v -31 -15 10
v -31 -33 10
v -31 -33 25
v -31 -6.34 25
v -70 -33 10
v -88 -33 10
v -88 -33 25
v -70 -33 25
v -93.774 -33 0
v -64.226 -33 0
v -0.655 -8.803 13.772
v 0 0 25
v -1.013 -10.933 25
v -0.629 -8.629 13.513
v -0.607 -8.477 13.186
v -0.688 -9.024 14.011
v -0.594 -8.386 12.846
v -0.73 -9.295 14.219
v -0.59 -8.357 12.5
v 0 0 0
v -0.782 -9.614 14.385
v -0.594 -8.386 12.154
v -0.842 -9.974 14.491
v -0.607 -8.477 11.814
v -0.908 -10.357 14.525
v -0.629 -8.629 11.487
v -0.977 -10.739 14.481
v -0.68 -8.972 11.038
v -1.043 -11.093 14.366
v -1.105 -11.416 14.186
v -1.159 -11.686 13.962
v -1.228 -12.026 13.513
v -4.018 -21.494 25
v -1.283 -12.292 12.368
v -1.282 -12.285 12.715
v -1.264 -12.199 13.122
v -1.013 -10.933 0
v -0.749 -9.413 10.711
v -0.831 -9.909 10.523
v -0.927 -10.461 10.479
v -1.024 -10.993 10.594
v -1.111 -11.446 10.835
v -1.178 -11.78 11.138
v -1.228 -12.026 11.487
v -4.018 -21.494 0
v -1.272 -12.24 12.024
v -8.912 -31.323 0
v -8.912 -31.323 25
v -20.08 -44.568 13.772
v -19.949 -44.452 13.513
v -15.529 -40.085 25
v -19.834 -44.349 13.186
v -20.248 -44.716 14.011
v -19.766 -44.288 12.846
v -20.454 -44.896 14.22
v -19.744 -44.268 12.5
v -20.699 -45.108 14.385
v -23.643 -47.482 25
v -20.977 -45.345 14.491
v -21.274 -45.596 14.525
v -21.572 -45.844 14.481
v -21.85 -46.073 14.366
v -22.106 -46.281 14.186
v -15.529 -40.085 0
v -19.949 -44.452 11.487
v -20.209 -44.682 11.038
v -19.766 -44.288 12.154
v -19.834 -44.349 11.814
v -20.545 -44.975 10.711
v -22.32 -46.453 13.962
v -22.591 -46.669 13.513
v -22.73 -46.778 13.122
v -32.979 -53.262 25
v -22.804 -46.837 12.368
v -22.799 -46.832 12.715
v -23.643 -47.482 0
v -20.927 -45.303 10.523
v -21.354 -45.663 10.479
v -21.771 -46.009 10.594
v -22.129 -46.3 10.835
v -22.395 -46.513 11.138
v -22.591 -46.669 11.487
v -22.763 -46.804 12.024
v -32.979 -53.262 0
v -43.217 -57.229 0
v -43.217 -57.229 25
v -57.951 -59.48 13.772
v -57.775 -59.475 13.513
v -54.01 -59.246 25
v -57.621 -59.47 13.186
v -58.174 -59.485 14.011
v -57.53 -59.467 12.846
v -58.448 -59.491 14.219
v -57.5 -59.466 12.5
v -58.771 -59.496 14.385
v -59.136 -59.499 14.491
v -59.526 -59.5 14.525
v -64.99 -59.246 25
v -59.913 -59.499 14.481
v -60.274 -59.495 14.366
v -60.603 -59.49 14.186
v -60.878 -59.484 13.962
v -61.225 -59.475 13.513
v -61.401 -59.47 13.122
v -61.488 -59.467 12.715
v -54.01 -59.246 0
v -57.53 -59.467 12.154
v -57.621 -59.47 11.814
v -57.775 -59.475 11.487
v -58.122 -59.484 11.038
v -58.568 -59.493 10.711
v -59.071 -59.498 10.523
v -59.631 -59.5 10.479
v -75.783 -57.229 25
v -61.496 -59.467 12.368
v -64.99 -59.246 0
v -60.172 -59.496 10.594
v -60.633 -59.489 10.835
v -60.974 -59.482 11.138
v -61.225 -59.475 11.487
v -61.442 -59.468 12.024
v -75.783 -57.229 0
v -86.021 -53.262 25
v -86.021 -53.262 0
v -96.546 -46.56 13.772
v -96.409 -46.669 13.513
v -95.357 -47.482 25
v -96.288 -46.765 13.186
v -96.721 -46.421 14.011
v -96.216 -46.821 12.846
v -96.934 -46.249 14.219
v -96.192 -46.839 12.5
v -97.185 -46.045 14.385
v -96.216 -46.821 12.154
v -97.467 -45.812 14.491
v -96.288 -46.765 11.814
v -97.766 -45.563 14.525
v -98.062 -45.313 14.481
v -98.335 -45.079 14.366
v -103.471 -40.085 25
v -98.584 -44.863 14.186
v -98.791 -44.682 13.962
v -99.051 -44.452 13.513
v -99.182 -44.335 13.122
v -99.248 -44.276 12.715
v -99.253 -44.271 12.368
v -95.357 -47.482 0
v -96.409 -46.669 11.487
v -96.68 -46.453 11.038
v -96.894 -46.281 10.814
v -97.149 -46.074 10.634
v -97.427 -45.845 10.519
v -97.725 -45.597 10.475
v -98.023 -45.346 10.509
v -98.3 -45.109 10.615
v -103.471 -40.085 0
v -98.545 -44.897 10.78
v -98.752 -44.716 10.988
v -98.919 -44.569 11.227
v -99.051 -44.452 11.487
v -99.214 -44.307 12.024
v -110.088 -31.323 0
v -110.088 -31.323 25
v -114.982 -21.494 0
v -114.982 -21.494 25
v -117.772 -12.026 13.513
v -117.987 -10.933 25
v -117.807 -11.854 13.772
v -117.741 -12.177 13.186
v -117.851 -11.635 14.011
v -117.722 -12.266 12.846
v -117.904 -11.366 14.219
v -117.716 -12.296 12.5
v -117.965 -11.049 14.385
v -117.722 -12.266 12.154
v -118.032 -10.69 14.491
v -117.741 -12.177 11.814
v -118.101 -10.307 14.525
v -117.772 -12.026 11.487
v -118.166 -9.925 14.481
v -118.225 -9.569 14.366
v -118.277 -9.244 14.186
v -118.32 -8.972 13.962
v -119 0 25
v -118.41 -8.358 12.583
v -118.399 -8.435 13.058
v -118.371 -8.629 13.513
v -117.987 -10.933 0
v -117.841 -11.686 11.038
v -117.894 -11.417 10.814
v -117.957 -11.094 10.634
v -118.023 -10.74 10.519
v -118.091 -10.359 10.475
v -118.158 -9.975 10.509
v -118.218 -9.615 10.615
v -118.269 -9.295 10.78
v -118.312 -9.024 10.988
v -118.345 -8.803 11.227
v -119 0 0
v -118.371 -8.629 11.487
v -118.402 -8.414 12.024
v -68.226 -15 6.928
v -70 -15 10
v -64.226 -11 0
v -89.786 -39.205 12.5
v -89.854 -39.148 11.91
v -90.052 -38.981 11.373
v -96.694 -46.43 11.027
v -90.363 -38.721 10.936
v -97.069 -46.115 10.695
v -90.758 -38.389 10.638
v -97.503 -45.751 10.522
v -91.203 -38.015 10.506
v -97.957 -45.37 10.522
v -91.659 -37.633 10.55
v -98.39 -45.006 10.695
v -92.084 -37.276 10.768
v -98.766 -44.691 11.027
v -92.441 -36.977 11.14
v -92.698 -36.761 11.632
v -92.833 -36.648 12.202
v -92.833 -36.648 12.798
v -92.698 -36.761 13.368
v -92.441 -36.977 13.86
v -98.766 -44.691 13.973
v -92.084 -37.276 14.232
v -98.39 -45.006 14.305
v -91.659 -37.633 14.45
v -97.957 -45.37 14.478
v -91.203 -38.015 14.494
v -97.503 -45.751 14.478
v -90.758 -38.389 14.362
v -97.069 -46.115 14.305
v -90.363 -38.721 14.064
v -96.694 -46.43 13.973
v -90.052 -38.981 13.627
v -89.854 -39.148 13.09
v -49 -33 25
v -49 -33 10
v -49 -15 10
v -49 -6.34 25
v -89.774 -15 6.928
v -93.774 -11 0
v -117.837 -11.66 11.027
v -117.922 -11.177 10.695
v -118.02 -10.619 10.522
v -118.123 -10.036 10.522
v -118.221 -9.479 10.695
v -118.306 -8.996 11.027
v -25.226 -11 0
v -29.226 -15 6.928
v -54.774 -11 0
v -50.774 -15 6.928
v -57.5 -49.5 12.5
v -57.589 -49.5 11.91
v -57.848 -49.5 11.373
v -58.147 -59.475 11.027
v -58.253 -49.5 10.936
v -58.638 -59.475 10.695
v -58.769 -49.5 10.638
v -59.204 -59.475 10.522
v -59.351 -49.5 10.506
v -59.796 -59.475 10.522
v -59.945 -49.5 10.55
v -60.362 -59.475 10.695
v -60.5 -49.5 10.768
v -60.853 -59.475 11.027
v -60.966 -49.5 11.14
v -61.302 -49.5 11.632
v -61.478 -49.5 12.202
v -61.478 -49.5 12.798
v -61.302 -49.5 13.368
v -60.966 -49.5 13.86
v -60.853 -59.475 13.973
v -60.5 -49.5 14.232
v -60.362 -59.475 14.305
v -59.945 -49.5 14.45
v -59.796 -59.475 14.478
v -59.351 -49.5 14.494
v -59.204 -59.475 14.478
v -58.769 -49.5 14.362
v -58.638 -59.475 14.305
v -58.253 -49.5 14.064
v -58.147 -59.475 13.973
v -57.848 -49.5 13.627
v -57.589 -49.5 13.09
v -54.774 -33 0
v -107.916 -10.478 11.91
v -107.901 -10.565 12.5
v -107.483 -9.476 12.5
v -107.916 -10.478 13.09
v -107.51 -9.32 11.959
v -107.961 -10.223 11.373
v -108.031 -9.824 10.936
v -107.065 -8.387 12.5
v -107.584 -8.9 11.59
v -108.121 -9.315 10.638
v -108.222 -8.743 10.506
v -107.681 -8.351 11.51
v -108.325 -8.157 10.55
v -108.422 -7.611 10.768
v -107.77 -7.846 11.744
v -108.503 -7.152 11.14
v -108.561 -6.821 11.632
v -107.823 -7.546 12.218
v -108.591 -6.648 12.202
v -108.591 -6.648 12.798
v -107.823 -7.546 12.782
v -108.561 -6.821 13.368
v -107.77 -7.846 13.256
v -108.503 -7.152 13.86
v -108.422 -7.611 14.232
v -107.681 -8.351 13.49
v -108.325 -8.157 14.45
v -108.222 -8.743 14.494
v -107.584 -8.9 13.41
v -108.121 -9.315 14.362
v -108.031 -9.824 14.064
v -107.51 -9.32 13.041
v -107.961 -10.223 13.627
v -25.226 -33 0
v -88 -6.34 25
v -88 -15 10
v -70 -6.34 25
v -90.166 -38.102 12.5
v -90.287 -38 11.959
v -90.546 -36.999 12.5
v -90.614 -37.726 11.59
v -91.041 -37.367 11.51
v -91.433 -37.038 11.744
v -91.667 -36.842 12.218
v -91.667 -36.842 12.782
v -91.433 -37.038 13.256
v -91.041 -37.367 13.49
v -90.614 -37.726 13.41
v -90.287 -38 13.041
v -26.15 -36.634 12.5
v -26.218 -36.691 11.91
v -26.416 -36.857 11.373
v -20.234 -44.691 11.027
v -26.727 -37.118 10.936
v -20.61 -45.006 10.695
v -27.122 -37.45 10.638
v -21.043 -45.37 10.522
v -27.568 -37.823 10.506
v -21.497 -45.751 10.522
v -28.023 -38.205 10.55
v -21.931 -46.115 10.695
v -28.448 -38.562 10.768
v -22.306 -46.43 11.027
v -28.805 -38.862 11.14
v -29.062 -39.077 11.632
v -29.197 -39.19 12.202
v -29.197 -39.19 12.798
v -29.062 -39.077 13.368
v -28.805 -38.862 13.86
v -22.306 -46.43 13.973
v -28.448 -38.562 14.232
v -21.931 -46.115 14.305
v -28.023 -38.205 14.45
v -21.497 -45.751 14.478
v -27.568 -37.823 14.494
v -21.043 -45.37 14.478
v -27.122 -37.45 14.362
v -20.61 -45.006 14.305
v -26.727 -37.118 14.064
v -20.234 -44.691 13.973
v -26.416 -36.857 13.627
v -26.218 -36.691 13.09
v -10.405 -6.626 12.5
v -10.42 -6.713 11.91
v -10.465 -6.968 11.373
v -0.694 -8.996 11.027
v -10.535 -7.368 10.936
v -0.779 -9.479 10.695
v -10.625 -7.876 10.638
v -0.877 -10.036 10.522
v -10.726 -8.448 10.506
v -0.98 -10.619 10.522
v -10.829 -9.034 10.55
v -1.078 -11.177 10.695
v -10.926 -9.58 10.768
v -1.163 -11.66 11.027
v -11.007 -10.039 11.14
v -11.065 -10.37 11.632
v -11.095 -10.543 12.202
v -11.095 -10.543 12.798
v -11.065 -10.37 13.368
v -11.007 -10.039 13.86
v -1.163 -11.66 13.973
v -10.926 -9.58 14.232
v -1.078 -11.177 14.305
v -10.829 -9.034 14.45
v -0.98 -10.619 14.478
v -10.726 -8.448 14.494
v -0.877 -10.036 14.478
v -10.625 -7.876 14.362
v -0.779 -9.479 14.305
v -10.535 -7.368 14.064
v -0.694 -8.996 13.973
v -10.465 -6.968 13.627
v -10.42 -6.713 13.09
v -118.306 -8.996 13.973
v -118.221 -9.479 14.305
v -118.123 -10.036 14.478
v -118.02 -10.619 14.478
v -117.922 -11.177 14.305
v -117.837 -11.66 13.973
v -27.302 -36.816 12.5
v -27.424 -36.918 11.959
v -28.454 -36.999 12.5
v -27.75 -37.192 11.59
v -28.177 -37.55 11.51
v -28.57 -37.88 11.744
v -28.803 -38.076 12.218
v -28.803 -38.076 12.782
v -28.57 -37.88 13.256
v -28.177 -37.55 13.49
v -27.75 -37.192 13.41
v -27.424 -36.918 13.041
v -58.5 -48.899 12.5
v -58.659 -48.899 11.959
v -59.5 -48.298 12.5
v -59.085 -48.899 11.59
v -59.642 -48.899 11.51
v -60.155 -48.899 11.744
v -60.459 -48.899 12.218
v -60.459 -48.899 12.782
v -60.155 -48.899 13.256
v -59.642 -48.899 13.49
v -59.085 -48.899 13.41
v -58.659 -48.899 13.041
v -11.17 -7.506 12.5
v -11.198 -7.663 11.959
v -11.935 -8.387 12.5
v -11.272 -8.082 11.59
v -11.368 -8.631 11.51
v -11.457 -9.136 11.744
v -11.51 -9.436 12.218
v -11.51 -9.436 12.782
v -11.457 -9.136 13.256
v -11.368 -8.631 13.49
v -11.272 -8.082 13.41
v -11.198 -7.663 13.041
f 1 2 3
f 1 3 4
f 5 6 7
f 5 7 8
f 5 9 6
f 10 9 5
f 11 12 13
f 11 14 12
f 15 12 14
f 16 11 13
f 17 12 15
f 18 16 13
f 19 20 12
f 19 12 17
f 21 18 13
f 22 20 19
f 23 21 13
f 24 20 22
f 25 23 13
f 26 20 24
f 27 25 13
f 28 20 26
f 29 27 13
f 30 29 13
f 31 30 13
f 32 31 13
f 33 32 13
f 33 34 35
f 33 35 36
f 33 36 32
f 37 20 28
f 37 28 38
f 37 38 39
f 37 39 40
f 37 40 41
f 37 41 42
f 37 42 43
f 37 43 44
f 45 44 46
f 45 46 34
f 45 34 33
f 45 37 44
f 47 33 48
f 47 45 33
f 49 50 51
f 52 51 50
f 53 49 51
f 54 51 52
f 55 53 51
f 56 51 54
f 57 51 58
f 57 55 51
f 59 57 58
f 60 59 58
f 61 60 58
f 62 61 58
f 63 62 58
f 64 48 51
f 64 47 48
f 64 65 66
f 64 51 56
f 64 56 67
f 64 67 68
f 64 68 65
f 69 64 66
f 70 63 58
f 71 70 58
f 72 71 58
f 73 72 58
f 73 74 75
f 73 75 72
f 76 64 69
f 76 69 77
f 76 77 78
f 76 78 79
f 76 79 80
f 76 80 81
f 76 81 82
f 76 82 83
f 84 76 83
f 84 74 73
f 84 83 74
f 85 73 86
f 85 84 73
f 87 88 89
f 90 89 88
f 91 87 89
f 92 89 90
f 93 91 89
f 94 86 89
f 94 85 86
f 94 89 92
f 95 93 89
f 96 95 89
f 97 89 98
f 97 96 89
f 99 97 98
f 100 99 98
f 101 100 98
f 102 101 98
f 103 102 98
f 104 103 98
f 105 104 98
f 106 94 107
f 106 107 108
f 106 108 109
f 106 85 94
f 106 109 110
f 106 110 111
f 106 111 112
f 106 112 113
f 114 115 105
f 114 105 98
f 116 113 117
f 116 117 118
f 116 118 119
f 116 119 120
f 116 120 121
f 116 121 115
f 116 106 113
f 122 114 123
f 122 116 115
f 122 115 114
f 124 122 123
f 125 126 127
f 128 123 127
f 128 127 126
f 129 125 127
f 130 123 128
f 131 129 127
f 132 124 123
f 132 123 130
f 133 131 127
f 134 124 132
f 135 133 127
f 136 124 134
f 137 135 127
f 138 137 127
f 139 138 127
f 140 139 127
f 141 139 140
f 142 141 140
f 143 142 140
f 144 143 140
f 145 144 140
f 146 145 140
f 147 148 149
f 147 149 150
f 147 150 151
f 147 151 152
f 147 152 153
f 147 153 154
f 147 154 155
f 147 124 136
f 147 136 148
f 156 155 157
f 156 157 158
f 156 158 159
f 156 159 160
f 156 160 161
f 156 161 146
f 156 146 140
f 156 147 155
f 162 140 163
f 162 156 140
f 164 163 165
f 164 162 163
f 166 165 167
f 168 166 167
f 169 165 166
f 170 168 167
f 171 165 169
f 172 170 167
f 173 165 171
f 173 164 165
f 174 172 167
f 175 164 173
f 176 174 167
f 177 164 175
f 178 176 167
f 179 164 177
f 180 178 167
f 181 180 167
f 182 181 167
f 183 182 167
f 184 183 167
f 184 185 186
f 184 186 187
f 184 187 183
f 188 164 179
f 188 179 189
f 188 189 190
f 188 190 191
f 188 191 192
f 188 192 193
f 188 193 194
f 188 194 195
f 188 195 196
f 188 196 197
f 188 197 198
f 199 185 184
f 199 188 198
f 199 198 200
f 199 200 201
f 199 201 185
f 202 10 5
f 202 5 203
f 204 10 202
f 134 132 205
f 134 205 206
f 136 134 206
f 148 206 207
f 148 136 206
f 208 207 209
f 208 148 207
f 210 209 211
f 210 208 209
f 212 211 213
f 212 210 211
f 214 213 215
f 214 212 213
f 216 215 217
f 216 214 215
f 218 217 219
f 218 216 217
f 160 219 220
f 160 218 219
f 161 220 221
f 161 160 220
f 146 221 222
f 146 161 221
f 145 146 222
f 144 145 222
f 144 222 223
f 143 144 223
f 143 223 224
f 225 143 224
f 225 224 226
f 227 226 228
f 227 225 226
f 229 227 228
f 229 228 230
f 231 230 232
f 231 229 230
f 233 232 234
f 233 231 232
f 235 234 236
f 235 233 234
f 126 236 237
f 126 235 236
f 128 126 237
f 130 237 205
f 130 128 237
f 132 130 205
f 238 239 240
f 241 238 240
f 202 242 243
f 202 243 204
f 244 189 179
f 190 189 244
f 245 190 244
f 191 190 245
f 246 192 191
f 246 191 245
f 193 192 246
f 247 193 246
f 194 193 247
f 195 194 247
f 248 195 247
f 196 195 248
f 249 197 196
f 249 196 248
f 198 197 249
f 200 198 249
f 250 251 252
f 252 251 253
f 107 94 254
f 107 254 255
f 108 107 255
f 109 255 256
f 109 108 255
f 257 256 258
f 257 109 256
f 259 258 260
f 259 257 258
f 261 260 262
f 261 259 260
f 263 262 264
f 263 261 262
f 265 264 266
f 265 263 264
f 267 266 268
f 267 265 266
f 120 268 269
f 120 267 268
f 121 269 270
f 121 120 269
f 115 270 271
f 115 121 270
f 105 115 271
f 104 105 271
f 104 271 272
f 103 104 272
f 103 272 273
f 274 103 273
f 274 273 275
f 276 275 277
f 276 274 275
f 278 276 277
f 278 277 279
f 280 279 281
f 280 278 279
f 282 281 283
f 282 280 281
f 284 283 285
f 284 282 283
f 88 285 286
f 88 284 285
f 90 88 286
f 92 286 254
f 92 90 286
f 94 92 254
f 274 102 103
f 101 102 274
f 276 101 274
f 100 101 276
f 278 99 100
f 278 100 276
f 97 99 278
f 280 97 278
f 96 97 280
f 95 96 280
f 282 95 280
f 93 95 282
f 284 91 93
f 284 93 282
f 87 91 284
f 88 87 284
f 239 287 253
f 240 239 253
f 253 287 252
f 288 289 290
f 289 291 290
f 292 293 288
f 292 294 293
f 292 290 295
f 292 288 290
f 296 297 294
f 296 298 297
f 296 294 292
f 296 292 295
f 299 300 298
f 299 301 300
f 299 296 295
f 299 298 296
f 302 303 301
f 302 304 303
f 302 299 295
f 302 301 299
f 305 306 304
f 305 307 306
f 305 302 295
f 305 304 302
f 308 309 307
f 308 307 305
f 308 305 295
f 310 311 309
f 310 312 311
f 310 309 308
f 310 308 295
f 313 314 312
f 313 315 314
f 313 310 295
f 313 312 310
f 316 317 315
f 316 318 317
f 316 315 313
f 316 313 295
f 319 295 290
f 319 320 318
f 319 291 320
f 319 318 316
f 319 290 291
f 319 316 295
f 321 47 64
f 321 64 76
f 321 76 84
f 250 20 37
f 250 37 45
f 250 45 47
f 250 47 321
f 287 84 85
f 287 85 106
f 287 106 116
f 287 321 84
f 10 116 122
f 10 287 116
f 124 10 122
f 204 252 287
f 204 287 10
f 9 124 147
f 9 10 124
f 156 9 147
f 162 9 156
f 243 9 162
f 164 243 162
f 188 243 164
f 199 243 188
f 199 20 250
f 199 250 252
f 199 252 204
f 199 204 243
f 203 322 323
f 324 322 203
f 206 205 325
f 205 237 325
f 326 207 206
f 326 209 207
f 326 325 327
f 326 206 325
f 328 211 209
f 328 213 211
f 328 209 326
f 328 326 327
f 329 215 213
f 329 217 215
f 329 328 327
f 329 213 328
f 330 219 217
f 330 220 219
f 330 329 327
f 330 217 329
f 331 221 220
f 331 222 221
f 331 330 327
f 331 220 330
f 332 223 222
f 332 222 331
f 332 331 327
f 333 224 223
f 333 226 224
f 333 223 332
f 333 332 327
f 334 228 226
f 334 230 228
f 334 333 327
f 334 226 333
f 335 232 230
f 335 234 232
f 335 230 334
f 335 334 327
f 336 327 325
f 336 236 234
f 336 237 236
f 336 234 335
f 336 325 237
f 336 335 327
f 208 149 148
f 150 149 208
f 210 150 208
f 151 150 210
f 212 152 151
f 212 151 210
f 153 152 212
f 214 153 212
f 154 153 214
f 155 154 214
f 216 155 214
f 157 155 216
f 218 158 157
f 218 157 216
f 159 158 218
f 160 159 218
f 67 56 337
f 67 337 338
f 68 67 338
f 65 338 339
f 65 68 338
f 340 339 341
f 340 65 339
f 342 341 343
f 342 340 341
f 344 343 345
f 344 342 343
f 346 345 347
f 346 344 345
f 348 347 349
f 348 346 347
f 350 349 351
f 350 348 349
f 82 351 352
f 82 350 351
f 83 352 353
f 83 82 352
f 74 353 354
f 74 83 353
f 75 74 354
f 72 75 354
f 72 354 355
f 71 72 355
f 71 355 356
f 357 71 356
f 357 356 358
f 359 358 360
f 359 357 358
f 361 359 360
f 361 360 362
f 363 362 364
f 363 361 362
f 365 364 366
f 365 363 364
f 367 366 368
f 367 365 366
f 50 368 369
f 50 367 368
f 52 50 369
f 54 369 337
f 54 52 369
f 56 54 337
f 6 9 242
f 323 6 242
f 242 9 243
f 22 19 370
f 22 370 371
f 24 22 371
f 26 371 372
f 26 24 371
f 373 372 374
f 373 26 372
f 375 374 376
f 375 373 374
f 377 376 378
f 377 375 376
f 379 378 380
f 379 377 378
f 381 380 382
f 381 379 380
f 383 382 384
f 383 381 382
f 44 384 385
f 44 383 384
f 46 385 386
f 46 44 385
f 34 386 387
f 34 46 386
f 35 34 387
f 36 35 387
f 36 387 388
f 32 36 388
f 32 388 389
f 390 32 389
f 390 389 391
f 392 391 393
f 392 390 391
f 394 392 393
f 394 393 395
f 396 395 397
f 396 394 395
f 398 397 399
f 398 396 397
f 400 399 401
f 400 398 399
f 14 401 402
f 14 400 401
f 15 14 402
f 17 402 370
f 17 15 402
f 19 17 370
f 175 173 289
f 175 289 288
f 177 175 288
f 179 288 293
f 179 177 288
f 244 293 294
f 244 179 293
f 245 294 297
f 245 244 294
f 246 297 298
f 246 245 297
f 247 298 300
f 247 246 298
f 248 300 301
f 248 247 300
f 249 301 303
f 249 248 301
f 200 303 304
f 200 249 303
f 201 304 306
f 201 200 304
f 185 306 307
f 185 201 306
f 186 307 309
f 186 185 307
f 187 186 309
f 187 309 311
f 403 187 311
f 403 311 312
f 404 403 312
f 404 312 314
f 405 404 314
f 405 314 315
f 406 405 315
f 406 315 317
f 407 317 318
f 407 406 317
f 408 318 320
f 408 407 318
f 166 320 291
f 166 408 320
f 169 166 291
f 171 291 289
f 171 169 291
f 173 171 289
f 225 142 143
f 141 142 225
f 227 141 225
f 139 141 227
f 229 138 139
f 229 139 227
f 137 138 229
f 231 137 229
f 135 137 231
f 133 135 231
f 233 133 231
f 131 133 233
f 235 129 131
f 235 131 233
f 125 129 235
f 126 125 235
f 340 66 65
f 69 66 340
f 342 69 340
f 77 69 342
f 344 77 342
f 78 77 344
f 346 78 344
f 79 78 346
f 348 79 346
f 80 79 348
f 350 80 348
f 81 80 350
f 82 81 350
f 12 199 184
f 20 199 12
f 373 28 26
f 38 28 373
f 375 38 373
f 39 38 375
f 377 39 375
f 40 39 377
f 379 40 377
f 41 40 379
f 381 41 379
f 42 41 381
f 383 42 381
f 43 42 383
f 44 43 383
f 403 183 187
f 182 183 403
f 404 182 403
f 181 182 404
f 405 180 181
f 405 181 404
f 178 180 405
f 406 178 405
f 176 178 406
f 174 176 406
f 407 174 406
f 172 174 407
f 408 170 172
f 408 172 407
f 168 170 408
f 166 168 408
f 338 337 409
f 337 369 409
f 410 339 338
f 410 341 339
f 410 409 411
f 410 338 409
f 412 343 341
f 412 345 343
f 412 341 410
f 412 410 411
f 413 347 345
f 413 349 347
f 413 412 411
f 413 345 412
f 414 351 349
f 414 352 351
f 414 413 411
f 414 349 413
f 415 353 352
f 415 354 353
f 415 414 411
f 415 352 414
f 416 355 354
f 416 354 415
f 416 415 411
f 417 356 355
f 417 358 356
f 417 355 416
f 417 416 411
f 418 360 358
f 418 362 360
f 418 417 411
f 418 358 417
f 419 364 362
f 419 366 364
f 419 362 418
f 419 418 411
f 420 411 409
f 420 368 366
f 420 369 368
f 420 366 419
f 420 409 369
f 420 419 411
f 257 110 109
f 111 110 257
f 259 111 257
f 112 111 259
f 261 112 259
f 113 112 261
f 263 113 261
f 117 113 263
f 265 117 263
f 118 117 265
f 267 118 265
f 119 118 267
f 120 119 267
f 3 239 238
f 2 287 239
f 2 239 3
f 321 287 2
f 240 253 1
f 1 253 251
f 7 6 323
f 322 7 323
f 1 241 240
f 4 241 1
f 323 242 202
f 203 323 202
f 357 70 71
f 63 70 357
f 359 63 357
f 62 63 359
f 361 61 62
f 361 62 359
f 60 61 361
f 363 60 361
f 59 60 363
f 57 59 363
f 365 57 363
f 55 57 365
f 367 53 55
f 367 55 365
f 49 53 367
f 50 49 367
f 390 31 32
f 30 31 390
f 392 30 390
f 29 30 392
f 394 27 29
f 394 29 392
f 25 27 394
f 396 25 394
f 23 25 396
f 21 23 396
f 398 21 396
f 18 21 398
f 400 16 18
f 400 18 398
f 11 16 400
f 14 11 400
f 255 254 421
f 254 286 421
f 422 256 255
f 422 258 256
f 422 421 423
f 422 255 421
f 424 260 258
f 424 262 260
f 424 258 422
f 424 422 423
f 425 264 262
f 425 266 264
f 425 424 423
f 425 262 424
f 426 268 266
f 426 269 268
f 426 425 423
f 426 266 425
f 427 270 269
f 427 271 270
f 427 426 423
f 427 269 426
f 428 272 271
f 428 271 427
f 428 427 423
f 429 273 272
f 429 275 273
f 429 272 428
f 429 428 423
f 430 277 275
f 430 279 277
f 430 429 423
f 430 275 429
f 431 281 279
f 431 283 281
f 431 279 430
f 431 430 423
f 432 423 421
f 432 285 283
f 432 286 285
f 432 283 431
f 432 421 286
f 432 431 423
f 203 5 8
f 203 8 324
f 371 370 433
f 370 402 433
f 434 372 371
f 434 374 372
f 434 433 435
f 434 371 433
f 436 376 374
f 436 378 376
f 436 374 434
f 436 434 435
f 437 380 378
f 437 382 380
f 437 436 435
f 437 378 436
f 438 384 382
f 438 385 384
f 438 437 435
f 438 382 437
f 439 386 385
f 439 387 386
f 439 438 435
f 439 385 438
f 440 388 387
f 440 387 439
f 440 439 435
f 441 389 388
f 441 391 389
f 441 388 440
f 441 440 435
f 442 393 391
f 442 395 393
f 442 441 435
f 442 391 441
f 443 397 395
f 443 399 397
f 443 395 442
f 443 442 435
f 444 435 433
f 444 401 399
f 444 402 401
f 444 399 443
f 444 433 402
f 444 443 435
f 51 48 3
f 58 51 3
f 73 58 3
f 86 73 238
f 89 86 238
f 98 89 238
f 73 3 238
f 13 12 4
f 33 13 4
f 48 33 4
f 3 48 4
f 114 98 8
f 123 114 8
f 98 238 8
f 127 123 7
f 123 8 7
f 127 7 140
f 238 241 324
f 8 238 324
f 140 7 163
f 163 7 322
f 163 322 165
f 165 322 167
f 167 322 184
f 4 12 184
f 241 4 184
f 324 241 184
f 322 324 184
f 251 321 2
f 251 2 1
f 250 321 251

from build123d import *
from OCP.BRepFilletAPI import BRepFilletAPI_MakeChamfer

# Parameters (mm, degrees)
SKETCH1_W           = 18
SKETCH1_H           = 18
BOSS_EXTRUDE1_DEPTH = 25
CIRPATTERN1_COUNT   = 5
CIRPATTERN1_ANGLE   = 160
CHAMFER1_SIZE       = 15
CHAMFER1_SIZE2      = 8.660254038
CHAMFER2_SIZE       = 10
CHAMFER2_SIZE2      = 5.773502692
CHAMFER3_SIZE       = 4
CHAMFER3_SIZE2      = 6.92820323


with BuildPart() as part:
    # Sketch1 → Boss-Extrude1 (new body)
    with BuildSketch(Plane.XY):
        with BuildLine():
            Line((-119, 0), (0, 0))
            ThreePointArc((0, 0), (-59.5, -59.5), (-119, 0))
        make_face()
        with Locations((-40, -24)):
            Rectangle(SKETCH1_W, SKETCH1_H, mode=Mode.SUBTRACT)
        with Locations((-79, -24)):
            Rectangle(SKETCH1_W, SKETCH1_H, mode=Mode.SUBTRACT)
    extrude(amount=BOSS_EXTRUDE1_DEPTH)

    # Sketch4 → Ø4.0mm Dowel Hole2 (revolve, cut)
    with BuildSketch(Plane(origin=(-0.903938696, -10.332066571, 12.5), x_dir=(0.1736481776669305, 0.9848077530122081, 0), z_dir=(0, 0, 1))):
        Polygon((0, 0), (0, 11.201721238), (2, 10), (2, 0.025), (2.025, 0), align=None)
    f_4_0mm_dowel_hole2 = revolve(axis=Axis((5.349590536, -11.434732499, 12.5), (-0.9848077530122081, 0.1736481776669305, 0)), mode=Mode.SUBTRACT)

    # CirPattern1: Ø4.0mm Dowel Hole2 ×5 about axis
    cirpattern1_axis = Axis((-59.5, 0, 0), (0, 0, -1))
    for i in range(1, CIRPATTERN1_COUNT):
        add(f_4_0mm_dowel_hole2.rotate(cirpattern1_axis, i * CIRPATTERN1_ANGLE / (CIRPATTERN1_COUNT - 1)), mode=Mode.SUBTRACT)

    # Chamfer1: one chamfer whose edges measure the first distance from different faces: ONE call of the kernel's chamfer builder (chamfer() names one face for all edges)
    chamfer1_edges_1 = [part.edges().sort_by_distance(p)[0] for p in [
        (-40, -15, 25),
    ]]
    chamfer1_side_1 = [part.faces().sort_by_distance(p)[0] for p in [
        (-40, -15, 12.5),
    ]]
    chamfer1_edges_2 = [part.edges().sort_by_distance(p)[0] for p in [
        (-79, -15, 25),
    ]]
    chamfer1_side_2 = [part.faces().sort_by_distance(p)[0] for p in [
        (-79, -15, 12.5),
    ]]
    chamfer1 = BRepFilletAPI_MakeChamfer(part.part.solid().wrapped)
    for e in chamfer1_edges_1:
        chamfer1.Add(CHAMFER1_SIZE, CHAMFER1_SIZE2, e.wrapped, chamfer1_side_1[0].wrapped)  # the first distance lies on this face
    for e in chamfer1_edges_2:
        chamfer1.Add(CHAMFER1_SIZE, CHAMFER1_SIZE2, e.wrapped, chamfer1_side_2[0].wrapped)  # the first distance lies on this face
    add(Compound.cast(chamfer1.Shape()), mode=Mode.REPLACE)

    # Chamfer2: one chamfer whose edges measure the first distance from different faces: ONE call of the kernel's chamfer builder (chamfer() names one face for all edges)
    chamfer2_edges_1 = [part.edges().sort_by_distance(p)[0] for p in [
        (-49, -24, 0),
    ]]
    chamfer2_side_1 = [part.faces().sort_by_distance(p)[0] for p in [
        (-49, -22.500700474, 13.445989877),
    ]]
    chamfer2_edges_2 = [part.edges().sort_by_distance(p)[0] for p in [
        (-31, -24, 0),
    ]]
    chamfer2_side_2 = [part.faces().sort_by_distance(p)[0] for p in [
        (-31, -22.500700474, 13.445989877),
    ]]
    chamfer2_edges_3 = [part.edges().sort_by_distance(p)[0] for p in [
        (-88, -24, 0),
    ]]
    chamfer2_side_3 = [part.faces().sort_by_distance(p)[0] for p in [
        (-88, -22.500700474, 13.445989877),
    ]]
    chamfer2_edges_4 = [part.edges().sort_by_distance(p)[0] for p in [
        (-70, -24, 0),
    ]]
    chamfer2_side_4 = [part.faces().sort_by_distance(p)[0] for p in [
        (-70, -22.500700474, 13.445989877),
    ]]
    chamfer2 = BRepFilletAPI_MakeChamfer(part.part.solid().wrapped)
    for e in chamfer2_edges_1:
        chamfer2.Add(CHAMFER2_SIZE, CHAMFER2_SIZE2, e.wrapped, chamfer2_side_1[0].wrapped)  # the first distance lies on this face
    for e in chamfer2_edges_2:
        chamfer2.Add(CHAMFER2_SIZE, CHAMFER2_SIZE2, e.wrapped, chamfer2_side_2[0].wrapped)  # the first distance lies on this face
    for e in chamfer2_edges_3:
        chamfer2.Add(CHAMFER2_SIZE, CHAMFER2_SIZE2, e.wrapped, chamfer2_side_3[0].wrapped)  # the first distance lies on this face
    for e in chamfer2_edges_4:
        chamfer2.Add(CHAMFER2_SIZE, CHAMFER2_SIZE2, e.wrapped, chamfer2_side_4[0].wrapped)  # the first distance lies on this face
    add(Compound.cast(chamfer2.Shape()), mode=Mode.REPLACE)

    # Chamfer3
    chamfer3_edges = [part.edges().sort_by_distance(p)[0] for p in [
        (-40, -15, 0),
        (-79, -15, 0),
    ]]
    chamfer3_side = [part.faces().sort_by_distance(p)[0] for p in [
        (-59.5, -25.548841696, 0),
    ]]
    chamfer(chamfer3_edges, length=CHAMFER3_SIZE, length2=CHAMFER3_SIZE2, reference=chamfer3_side[0])


solid = part.part
